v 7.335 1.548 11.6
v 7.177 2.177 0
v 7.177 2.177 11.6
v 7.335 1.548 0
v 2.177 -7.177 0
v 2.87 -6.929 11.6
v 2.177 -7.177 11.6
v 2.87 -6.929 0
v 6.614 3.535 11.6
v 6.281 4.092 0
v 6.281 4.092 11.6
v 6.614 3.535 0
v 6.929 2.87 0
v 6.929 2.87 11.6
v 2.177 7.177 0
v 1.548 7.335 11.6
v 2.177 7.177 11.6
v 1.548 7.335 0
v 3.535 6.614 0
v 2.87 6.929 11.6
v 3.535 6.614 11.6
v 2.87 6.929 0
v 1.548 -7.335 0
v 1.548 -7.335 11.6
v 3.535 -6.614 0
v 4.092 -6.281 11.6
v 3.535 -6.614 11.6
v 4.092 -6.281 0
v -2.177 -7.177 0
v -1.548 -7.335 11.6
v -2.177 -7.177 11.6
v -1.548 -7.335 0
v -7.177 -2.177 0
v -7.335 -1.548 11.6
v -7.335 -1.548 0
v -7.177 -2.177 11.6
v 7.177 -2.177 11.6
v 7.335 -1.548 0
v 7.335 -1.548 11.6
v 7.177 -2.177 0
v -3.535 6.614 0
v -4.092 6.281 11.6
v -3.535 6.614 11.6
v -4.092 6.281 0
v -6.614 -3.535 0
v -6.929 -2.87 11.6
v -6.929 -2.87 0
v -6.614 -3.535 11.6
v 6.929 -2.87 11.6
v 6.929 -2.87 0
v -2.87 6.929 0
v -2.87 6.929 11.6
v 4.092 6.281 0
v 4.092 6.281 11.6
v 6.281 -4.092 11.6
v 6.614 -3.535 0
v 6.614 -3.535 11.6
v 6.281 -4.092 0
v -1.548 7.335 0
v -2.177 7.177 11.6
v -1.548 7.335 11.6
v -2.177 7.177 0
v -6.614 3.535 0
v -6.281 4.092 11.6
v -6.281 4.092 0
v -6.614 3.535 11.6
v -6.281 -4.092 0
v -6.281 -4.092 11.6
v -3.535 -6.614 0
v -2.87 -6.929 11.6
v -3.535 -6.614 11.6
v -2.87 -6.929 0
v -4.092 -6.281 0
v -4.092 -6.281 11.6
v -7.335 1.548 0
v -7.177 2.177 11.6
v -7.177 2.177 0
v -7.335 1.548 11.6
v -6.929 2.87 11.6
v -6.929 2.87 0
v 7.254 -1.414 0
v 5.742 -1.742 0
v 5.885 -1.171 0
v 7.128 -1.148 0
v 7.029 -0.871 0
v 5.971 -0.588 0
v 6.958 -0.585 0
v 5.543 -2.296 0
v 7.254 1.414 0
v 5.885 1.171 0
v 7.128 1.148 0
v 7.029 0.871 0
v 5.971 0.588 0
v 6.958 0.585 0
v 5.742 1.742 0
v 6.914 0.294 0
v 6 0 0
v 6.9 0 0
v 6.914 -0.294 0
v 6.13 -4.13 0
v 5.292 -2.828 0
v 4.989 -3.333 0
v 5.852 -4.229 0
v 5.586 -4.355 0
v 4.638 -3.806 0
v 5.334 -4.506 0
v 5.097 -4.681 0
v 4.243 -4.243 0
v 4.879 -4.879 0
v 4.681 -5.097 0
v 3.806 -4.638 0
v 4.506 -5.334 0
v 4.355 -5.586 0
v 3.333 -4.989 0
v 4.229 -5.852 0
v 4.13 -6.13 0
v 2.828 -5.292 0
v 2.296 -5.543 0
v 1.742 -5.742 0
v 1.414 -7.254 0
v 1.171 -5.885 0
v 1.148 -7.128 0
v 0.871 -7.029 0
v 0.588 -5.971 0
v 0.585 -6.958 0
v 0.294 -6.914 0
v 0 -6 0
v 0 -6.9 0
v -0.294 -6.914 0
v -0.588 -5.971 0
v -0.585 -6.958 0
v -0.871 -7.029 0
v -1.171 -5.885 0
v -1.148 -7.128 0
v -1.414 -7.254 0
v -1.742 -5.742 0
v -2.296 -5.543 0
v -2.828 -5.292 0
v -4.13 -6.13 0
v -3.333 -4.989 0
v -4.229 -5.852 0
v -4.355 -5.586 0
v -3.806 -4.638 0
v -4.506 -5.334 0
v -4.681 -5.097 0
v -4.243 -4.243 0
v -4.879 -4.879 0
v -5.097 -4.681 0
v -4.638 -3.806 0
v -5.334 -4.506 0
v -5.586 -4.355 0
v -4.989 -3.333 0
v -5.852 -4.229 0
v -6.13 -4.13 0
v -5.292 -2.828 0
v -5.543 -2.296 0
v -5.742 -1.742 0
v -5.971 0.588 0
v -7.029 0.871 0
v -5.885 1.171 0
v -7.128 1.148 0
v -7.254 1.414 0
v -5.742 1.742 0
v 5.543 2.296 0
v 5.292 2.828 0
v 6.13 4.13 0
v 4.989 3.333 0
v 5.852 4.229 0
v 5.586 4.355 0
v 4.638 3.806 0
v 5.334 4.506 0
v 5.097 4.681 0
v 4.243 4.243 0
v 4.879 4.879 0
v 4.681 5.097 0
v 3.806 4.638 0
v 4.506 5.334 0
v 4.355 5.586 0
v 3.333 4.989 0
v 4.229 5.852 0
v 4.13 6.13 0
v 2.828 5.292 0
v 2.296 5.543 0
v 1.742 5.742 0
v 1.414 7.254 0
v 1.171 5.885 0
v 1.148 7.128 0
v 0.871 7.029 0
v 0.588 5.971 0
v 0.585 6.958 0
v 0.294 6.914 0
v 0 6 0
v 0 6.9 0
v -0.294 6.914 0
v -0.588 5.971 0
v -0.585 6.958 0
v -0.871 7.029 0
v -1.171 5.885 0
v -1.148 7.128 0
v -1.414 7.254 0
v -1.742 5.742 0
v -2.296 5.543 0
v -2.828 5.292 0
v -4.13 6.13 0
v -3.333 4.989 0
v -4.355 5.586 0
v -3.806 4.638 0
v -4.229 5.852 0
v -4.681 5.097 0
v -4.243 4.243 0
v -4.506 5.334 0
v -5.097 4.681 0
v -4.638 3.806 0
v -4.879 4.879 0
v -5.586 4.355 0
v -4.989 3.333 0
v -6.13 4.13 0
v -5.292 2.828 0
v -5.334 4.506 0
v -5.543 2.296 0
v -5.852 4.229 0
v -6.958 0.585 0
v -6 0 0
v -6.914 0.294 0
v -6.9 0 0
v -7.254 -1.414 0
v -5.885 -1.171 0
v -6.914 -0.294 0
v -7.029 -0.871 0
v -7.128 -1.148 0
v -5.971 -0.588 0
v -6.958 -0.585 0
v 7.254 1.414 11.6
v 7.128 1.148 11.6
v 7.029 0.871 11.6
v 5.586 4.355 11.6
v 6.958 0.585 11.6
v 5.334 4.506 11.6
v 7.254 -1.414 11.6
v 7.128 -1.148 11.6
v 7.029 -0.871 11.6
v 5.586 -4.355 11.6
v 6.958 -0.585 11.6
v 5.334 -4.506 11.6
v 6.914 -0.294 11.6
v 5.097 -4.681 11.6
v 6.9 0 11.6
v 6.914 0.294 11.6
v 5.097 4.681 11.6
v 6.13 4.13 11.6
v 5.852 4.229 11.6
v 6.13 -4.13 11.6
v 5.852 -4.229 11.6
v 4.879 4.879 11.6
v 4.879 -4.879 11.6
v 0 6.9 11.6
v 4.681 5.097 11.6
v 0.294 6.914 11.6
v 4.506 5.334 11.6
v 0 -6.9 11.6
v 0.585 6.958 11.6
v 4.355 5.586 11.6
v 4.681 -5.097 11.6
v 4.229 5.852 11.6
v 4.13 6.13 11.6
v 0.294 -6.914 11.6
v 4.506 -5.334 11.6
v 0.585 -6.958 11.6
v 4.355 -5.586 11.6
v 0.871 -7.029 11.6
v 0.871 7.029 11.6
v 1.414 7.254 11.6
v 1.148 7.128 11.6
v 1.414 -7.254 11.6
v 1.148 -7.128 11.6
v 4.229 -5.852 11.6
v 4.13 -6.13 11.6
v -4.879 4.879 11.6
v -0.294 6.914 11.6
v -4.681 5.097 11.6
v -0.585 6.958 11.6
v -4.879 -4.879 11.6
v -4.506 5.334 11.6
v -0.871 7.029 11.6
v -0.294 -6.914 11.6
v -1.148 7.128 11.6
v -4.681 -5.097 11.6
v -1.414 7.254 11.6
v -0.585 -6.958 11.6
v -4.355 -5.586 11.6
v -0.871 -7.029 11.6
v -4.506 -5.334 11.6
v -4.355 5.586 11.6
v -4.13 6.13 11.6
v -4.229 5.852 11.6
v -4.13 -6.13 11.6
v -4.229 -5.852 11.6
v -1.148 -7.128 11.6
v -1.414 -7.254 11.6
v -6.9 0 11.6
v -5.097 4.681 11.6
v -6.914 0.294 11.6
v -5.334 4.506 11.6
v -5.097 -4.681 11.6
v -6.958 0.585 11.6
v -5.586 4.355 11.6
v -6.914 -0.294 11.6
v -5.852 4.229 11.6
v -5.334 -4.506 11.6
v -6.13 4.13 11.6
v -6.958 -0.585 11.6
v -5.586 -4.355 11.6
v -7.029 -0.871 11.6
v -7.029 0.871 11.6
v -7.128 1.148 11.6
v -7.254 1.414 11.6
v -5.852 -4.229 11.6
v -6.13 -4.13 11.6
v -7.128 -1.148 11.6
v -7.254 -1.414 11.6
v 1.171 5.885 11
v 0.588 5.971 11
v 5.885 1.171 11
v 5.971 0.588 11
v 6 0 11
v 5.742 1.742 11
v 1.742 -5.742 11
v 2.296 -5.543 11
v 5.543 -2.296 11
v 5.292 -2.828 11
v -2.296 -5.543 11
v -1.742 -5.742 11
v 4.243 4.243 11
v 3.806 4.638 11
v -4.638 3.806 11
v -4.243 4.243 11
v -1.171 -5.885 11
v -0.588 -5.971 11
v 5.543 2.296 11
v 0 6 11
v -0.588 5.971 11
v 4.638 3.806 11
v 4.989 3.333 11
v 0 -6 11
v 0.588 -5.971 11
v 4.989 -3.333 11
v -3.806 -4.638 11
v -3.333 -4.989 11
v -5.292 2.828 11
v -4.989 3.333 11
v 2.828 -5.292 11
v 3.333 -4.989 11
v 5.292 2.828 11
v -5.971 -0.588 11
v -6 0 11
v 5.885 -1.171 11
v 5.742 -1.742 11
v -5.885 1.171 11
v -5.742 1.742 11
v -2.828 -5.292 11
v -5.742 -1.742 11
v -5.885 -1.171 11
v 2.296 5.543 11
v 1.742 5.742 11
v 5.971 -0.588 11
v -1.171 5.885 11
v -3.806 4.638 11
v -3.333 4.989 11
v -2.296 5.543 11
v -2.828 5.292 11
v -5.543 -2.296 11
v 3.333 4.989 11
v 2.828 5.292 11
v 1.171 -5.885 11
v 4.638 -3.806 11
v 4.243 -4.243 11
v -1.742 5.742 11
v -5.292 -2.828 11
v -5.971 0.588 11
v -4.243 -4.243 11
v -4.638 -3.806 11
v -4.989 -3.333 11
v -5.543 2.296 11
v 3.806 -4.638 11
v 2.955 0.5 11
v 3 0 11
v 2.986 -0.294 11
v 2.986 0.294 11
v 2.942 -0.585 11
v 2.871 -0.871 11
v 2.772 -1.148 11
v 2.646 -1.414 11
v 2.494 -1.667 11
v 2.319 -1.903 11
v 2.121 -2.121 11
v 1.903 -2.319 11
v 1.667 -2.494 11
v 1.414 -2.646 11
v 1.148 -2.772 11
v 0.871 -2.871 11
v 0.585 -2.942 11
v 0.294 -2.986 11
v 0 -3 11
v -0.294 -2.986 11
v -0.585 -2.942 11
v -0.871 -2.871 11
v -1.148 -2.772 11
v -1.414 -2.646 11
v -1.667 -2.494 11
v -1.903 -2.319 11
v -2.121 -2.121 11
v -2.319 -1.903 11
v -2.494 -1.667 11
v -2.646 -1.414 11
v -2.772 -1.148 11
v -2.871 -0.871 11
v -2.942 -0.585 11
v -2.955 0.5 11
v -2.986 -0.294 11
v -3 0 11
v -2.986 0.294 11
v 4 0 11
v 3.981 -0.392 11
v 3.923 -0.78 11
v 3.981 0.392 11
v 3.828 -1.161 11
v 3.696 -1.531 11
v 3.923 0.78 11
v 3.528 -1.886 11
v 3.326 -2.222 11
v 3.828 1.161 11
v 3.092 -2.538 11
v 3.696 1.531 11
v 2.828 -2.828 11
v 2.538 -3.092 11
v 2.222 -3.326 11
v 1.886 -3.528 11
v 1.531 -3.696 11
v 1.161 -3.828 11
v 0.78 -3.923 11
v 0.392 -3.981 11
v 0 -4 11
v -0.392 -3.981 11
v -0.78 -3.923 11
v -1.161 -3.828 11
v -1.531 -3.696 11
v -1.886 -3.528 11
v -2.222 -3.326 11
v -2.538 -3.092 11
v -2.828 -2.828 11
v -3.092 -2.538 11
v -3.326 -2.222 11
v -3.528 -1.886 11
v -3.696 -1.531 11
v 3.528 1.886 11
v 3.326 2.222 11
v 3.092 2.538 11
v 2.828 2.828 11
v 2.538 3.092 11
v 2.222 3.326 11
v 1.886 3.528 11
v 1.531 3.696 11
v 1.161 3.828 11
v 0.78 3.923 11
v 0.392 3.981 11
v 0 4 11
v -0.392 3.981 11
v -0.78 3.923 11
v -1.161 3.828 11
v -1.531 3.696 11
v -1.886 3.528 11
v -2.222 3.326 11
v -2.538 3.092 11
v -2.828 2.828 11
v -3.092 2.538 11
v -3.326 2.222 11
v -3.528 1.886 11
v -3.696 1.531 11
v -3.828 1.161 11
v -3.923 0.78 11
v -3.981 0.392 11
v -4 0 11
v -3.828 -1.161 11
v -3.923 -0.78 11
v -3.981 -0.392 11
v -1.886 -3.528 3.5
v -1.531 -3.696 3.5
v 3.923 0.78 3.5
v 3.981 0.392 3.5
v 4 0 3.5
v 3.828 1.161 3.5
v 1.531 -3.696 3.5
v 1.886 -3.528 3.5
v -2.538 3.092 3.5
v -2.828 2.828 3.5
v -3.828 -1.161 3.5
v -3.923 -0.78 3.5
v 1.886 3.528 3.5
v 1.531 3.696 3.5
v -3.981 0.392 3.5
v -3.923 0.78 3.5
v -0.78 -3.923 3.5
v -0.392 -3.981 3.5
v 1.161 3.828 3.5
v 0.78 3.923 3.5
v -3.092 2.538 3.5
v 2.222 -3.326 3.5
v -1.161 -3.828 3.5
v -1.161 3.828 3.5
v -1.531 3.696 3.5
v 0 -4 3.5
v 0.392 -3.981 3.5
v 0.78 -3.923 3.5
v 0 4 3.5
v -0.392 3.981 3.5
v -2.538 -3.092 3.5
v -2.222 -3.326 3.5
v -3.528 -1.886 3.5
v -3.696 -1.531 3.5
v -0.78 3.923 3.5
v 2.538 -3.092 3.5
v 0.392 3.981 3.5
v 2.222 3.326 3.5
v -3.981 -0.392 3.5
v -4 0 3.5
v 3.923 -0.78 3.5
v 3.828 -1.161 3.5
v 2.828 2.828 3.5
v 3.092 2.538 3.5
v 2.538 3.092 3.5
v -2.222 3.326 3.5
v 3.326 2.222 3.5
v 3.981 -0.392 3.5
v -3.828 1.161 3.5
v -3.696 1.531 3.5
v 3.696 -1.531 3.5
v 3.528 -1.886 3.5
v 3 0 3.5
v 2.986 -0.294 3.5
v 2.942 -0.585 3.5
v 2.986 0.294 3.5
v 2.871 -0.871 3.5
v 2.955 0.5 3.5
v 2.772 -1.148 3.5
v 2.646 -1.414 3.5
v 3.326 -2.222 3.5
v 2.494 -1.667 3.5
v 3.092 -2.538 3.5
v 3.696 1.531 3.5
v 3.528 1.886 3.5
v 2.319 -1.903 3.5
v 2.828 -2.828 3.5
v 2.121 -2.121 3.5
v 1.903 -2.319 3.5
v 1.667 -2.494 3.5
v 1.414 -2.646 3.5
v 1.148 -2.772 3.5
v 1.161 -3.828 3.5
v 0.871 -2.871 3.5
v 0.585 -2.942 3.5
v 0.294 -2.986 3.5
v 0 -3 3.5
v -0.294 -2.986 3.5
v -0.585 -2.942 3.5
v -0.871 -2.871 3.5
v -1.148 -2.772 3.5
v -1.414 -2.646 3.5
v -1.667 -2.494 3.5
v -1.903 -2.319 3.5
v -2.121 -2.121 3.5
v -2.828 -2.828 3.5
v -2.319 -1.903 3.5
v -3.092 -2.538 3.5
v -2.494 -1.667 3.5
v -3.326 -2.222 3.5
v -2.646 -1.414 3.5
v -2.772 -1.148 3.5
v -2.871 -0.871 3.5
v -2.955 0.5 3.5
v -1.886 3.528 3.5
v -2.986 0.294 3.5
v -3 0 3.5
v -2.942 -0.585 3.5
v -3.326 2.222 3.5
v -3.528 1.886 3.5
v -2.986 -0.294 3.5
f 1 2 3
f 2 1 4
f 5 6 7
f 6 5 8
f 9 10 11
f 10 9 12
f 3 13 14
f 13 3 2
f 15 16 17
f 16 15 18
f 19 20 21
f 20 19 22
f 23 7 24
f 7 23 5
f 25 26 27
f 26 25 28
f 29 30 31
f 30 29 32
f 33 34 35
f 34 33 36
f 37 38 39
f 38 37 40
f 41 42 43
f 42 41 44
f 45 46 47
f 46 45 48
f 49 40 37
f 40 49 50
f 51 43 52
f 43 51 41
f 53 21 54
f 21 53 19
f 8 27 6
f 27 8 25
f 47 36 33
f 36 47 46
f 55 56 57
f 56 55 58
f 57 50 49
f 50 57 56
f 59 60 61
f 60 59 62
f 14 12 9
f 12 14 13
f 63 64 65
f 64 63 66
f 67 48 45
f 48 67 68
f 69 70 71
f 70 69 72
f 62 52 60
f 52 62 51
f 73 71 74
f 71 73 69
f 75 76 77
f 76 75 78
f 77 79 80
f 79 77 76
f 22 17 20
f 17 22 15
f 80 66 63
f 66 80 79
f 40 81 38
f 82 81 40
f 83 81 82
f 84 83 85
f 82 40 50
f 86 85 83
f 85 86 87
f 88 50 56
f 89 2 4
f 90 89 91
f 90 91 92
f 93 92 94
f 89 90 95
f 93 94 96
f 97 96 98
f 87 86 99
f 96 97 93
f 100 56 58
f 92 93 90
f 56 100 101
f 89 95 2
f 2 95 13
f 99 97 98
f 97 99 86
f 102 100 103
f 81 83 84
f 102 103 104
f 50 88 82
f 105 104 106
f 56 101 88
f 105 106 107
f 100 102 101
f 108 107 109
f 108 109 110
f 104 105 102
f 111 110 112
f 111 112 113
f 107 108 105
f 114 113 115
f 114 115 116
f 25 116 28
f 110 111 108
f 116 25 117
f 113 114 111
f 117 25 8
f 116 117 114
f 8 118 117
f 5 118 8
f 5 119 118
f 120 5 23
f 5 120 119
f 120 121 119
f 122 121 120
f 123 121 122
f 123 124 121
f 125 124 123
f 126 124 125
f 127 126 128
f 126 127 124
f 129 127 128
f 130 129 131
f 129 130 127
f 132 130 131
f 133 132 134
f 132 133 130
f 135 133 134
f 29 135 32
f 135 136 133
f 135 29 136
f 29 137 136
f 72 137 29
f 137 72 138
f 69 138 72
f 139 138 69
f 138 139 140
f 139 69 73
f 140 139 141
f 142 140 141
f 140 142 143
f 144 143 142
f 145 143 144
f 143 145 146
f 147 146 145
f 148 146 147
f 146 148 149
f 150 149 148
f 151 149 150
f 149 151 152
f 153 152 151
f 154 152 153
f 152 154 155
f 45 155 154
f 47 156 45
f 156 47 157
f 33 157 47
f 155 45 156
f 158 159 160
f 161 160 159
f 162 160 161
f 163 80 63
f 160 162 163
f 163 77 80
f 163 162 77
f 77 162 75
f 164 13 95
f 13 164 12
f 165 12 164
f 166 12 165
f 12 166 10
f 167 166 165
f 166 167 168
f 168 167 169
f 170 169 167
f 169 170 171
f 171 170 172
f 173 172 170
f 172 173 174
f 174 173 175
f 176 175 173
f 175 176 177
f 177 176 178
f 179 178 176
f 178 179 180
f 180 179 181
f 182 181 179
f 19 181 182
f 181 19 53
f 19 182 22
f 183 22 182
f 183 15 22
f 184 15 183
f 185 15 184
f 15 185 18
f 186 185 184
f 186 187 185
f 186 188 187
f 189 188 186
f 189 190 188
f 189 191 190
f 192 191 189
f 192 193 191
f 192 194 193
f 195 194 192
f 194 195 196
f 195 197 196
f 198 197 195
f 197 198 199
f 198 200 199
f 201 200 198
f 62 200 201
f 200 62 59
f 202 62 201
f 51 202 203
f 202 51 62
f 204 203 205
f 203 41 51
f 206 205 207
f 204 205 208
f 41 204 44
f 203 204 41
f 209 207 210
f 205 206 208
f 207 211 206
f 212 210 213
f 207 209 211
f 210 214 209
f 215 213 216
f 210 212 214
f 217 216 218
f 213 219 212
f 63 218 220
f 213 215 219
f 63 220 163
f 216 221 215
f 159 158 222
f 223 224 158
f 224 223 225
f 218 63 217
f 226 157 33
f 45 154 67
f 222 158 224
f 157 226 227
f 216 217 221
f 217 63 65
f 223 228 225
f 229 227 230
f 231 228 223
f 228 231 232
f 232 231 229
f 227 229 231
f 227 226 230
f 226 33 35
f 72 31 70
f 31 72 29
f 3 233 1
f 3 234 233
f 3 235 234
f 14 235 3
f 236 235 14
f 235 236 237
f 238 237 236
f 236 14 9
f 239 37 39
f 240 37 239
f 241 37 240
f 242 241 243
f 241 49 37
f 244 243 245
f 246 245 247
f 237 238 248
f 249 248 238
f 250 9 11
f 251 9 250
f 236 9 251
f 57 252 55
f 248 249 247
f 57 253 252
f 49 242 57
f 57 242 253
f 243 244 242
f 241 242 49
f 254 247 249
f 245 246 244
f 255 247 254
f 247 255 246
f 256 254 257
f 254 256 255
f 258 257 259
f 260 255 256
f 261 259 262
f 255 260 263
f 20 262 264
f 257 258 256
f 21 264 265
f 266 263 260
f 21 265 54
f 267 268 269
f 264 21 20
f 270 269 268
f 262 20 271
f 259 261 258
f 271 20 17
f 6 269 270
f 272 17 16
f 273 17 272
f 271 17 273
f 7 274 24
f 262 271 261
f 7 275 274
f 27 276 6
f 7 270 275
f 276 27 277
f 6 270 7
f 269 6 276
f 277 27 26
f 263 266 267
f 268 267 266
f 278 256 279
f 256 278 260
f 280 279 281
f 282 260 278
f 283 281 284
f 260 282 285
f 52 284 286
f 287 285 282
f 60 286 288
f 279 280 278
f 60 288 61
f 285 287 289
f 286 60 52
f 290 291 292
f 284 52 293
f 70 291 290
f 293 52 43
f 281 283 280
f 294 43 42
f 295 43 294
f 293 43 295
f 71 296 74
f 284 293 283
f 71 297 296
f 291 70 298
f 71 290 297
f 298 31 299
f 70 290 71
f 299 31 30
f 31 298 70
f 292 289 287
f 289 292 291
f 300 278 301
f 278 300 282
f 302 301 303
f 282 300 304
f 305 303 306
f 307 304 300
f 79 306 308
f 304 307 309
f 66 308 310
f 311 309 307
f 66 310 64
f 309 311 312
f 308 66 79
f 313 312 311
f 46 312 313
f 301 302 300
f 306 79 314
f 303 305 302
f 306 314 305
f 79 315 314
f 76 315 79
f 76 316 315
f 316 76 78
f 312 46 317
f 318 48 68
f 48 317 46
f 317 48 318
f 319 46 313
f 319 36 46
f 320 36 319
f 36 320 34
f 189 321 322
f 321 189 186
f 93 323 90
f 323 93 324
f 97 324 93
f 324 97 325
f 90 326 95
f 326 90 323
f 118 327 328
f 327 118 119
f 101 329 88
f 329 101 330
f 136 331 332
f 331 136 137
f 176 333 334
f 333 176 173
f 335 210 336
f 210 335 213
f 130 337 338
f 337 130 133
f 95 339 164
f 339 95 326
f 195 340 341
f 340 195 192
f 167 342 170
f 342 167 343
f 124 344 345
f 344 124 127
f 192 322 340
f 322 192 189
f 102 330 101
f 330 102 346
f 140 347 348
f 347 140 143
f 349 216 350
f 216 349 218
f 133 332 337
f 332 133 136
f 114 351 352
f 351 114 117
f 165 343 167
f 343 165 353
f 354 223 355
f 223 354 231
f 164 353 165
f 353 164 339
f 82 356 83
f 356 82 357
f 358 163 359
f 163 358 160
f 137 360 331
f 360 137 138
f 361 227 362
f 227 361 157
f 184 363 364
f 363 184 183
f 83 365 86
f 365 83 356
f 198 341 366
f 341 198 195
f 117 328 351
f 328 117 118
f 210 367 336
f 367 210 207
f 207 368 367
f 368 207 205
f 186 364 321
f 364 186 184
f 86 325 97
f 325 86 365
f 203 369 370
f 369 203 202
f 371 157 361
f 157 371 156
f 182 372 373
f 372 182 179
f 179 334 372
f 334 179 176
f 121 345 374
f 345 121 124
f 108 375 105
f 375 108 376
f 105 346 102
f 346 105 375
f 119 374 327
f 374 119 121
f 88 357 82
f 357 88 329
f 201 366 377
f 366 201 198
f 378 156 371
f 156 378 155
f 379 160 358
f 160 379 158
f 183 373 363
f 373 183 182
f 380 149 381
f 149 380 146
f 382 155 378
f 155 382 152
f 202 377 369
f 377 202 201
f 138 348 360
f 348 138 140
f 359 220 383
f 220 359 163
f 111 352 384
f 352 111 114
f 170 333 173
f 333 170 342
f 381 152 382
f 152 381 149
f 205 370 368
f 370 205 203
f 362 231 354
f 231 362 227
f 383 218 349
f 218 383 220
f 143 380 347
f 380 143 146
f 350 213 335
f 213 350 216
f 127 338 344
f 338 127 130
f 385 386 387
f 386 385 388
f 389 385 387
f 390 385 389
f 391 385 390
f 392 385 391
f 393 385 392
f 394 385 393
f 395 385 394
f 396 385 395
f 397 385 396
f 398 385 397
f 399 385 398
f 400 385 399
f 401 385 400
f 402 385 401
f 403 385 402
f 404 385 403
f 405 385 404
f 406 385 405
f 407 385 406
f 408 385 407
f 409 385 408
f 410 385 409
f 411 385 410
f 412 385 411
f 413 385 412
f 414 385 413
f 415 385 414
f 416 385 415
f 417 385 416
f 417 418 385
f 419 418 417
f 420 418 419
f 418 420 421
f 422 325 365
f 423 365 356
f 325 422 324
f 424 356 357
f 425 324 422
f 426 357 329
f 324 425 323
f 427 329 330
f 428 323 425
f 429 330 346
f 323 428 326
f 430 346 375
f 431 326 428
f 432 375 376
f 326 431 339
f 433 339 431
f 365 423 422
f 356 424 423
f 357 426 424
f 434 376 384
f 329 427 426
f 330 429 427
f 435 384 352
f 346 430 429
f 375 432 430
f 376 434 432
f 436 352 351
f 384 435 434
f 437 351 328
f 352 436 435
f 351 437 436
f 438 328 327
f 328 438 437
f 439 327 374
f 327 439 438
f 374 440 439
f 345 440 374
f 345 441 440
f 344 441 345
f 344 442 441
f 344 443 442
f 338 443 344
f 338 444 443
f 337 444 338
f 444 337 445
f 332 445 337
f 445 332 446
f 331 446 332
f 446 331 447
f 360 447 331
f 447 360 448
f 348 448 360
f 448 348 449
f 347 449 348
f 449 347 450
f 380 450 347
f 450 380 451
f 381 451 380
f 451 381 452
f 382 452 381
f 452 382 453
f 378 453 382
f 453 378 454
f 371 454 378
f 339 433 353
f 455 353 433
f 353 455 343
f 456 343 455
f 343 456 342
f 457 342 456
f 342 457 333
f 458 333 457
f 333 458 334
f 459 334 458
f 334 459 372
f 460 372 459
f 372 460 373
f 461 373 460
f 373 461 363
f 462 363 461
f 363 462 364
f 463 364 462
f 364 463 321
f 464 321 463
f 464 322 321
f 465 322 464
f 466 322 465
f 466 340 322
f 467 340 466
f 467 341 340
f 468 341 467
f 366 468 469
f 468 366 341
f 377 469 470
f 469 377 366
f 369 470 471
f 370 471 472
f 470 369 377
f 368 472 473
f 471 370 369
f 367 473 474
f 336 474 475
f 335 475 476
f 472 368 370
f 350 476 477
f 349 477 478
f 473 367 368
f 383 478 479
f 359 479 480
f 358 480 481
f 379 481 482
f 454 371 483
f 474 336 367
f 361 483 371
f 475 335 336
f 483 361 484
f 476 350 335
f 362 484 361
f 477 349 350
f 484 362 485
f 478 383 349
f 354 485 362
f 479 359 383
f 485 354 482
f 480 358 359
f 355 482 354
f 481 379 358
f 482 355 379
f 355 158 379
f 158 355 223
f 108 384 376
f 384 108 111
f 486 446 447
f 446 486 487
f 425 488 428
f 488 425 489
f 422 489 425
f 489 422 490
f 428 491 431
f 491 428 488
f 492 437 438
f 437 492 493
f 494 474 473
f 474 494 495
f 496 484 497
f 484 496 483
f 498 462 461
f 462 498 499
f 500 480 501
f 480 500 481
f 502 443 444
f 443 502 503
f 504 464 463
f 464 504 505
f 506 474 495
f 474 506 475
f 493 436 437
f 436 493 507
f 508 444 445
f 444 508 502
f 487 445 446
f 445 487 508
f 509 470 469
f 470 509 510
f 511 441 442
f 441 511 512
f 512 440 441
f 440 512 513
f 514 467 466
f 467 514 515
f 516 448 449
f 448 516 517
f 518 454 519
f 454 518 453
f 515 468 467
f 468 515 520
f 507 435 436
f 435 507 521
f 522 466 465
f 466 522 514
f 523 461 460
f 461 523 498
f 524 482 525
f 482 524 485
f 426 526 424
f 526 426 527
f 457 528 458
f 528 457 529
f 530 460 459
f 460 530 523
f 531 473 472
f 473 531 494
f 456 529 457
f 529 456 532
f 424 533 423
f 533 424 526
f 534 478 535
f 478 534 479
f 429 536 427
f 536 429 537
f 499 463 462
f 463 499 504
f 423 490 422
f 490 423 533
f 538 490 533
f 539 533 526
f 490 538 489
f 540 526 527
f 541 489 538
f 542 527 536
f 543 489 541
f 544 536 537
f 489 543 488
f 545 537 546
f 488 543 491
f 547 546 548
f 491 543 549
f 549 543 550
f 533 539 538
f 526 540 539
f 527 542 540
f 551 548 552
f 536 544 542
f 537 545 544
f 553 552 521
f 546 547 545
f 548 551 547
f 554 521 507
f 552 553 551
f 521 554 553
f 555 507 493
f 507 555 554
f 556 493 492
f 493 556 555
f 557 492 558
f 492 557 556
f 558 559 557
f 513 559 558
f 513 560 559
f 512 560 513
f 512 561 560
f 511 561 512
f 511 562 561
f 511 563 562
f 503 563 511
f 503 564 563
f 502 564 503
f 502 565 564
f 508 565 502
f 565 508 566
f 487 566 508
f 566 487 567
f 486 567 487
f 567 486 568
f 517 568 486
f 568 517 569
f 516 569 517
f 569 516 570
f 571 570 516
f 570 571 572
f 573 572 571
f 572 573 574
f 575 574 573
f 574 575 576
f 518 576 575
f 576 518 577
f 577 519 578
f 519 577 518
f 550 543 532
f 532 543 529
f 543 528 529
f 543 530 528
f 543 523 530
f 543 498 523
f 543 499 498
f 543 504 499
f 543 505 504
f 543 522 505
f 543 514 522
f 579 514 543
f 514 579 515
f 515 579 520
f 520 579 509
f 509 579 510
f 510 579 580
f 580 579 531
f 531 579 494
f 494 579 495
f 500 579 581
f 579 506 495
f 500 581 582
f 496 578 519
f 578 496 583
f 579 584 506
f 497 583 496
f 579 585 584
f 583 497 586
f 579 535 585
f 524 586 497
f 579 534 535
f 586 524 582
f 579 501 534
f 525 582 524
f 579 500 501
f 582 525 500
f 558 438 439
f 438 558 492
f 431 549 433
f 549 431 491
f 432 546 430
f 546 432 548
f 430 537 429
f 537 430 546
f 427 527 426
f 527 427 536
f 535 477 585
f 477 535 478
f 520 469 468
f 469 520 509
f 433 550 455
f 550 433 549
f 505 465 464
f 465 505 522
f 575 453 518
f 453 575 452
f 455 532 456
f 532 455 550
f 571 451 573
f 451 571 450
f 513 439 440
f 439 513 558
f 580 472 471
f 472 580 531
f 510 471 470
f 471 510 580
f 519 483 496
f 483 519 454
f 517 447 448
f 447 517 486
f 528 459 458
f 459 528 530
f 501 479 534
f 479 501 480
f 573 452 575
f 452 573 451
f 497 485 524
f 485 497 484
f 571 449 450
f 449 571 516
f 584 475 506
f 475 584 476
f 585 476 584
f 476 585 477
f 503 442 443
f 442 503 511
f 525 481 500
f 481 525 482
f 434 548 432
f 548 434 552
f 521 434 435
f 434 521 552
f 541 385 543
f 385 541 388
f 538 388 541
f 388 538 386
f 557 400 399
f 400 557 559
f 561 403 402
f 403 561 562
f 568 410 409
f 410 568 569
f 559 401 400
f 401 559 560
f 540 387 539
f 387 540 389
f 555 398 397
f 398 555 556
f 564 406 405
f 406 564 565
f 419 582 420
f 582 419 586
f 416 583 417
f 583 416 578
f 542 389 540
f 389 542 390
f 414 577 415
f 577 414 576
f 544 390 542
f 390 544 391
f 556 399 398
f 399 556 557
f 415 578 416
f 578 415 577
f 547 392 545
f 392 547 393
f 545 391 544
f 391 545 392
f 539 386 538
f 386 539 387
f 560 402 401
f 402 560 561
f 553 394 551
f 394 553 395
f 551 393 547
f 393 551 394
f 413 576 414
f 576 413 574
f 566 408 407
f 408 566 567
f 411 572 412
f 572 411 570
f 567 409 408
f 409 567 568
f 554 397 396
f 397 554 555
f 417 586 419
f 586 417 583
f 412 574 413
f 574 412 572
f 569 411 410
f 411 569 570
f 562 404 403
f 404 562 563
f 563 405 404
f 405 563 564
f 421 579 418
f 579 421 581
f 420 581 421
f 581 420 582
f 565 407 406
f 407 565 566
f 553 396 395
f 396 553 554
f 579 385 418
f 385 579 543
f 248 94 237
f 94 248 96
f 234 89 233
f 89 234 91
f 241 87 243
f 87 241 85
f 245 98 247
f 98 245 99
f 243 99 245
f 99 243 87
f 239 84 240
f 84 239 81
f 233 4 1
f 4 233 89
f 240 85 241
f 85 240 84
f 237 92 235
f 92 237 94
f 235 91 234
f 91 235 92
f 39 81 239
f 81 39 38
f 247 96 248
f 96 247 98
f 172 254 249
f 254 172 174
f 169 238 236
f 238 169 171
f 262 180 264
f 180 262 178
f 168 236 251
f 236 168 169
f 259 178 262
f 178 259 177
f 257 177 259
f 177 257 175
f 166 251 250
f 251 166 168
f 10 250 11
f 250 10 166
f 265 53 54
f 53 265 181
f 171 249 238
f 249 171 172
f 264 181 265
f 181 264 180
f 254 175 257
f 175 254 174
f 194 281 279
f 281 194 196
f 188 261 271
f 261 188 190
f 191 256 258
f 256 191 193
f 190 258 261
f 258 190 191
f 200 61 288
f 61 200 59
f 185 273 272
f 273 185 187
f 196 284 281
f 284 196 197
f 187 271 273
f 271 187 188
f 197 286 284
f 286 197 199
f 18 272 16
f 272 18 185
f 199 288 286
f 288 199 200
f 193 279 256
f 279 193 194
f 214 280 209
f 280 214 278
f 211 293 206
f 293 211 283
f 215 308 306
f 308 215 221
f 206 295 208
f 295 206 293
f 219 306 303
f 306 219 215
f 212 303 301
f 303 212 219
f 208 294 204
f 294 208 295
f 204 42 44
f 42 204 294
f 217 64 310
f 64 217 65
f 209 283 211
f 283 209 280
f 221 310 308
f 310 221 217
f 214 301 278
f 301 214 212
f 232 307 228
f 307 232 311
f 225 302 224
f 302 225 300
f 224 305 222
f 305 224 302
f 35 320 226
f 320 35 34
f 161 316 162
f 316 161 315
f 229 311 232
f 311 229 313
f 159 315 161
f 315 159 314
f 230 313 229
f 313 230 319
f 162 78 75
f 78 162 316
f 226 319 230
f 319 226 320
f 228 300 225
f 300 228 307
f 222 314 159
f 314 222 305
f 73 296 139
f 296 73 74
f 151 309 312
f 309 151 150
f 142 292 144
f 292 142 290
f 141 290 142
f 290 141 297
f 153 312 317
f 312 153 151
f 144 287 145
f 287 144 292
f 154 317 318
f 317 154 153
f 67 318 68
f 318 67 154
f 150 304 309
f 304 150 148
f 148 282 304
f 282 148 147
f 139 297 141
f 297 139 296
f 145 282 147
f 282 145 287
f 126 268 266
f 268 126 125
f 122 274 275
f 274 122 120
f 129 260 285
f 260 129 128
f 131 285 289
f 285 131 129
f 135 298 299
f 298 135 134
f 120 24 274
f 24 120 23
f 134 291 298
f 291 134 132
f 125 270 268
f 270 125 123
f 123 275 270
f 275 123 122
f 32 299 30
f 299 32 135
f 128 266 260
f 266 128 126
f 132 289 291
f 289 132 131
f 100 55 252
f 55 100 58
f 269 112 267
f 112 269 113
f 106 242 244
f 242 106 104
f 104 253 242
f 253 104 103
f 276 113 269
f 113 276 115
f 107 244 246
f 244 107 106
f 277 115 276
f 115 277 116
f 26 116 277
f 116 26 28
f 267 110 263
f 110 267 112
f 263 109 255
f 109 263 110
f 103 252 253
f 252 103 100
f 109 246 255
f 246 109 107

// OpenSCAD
$fn = 64;

KNOB_OUTER_D=15;
KNOB_INNER_D=12;
KNOB_OUTER_SIZE_Z=12;
KNOB_INNER_SIZE_Z=11;

KNOB_CAP_SIZE_Z=2;
KNOB_CAP_SPHERE_R=16;

NUMBER_OF_CUTS=8;

KNOB_GRAB_SIZE_Z=7.5;
KNOB_GRAB_D=6; /////////////////////////////////////////////// CHANGE_THIS. tried [8, 7, 6]  
KNOB_GRAB_THICKNESS=1;
KNOB_GRAB_FIXATOR_THICKNESS=2.5; ///////////////////////////// CHANGE_THIS: tried [3, 2.5]

KNOB_OUTER_R=KNOB_OUTER_D / 2;
KNOB_INNER_R=KNOB_INNER_D / 2;
KNOB_GRAB_R=KNOB_GRAB_D / 2;

KNOB_CUT_RADIUS=3;
KNOB_CUT_ANGLE=360/NUMBER_OF_CUTS;

KNOB_CUT_DISTANCE=KNOB_OUTER_R - 0.6;

module knob_base() {
    difference() {
        cylinder(r=KNOB_OUTER_R, h=KNOB_OUTER_SIZE_Z - 0.4);
        translate([0, 0, -1])
            cylinder(r=KNOB_INNER_R, h=KNOB_INNER_SIZE_Z + 1);
    }
}

module knob_cap() {
    difference() {
        intersection() {
            cylinder(r=KNOB_OUTER_R, h=KNOB_OUTER_SIZE_Z * 2);
            translate([0, 0, 0 - KNOB_CAP_SPHERE_R + KNOB_OUTER_SIZE_Z + KNOB_CAP_SIZE_Z])
                sphere(r=KNOB_CAP_SPHERE_R, $fn = 128);
        }
        cylinder(r=KNOB_OUTER_R, h=KNOB_OUTER_SIZE_Z - 0.4);
    }
}

module knob_cut() {
    for(i=[0:NUMBER_OF_CUTS]) {
        rotate([0, 0, i * KNOB_CUT_ANGLE])
            translate([KNOB_CUT_RADIUS + KNOB_CUT_DISTANCE, 0, -1])
                cylinder(r=KNOB_CUT_RADIUS, h=KNOB_OUTER_SIZE_Z * 2);
    }
}

module knob_inner() {
    translate([0, 0, KNOB_INNER_SIZE_Z - KNOB_GRAB_SIZE_Z]) {
        difference() {
            cylinder(r=KNOB_GRAB_R + KNOB_GRAB_THICKNESS, h=KNOB_GRAB_SIZE_Z);
            translate([0, 0, -1])
                cylinder(r=KNOB_GRAB_R, h=KNOB_GRAB_SIZE_Z + 1);
        }
        intersection() {
            cylinder(r=KNOB_GRAB_R, h=KNOB_GRAB_SIZE_Z);
            translate([0-KNOB_GRAB_R, KNOB_GRAB_R - KNOB_GRAB_FIXATOR_THICKNESS, 0])
                cube([KNOB_GRAB_D, KNOB_GRAB_D, KNOB_GRAB_SIZE_Z]);
        }
    }
}

difference() {
    union() {
        /* knob_cap(); */
        knob_base();
        knob_inner();
    }
    knob_cut();
}
